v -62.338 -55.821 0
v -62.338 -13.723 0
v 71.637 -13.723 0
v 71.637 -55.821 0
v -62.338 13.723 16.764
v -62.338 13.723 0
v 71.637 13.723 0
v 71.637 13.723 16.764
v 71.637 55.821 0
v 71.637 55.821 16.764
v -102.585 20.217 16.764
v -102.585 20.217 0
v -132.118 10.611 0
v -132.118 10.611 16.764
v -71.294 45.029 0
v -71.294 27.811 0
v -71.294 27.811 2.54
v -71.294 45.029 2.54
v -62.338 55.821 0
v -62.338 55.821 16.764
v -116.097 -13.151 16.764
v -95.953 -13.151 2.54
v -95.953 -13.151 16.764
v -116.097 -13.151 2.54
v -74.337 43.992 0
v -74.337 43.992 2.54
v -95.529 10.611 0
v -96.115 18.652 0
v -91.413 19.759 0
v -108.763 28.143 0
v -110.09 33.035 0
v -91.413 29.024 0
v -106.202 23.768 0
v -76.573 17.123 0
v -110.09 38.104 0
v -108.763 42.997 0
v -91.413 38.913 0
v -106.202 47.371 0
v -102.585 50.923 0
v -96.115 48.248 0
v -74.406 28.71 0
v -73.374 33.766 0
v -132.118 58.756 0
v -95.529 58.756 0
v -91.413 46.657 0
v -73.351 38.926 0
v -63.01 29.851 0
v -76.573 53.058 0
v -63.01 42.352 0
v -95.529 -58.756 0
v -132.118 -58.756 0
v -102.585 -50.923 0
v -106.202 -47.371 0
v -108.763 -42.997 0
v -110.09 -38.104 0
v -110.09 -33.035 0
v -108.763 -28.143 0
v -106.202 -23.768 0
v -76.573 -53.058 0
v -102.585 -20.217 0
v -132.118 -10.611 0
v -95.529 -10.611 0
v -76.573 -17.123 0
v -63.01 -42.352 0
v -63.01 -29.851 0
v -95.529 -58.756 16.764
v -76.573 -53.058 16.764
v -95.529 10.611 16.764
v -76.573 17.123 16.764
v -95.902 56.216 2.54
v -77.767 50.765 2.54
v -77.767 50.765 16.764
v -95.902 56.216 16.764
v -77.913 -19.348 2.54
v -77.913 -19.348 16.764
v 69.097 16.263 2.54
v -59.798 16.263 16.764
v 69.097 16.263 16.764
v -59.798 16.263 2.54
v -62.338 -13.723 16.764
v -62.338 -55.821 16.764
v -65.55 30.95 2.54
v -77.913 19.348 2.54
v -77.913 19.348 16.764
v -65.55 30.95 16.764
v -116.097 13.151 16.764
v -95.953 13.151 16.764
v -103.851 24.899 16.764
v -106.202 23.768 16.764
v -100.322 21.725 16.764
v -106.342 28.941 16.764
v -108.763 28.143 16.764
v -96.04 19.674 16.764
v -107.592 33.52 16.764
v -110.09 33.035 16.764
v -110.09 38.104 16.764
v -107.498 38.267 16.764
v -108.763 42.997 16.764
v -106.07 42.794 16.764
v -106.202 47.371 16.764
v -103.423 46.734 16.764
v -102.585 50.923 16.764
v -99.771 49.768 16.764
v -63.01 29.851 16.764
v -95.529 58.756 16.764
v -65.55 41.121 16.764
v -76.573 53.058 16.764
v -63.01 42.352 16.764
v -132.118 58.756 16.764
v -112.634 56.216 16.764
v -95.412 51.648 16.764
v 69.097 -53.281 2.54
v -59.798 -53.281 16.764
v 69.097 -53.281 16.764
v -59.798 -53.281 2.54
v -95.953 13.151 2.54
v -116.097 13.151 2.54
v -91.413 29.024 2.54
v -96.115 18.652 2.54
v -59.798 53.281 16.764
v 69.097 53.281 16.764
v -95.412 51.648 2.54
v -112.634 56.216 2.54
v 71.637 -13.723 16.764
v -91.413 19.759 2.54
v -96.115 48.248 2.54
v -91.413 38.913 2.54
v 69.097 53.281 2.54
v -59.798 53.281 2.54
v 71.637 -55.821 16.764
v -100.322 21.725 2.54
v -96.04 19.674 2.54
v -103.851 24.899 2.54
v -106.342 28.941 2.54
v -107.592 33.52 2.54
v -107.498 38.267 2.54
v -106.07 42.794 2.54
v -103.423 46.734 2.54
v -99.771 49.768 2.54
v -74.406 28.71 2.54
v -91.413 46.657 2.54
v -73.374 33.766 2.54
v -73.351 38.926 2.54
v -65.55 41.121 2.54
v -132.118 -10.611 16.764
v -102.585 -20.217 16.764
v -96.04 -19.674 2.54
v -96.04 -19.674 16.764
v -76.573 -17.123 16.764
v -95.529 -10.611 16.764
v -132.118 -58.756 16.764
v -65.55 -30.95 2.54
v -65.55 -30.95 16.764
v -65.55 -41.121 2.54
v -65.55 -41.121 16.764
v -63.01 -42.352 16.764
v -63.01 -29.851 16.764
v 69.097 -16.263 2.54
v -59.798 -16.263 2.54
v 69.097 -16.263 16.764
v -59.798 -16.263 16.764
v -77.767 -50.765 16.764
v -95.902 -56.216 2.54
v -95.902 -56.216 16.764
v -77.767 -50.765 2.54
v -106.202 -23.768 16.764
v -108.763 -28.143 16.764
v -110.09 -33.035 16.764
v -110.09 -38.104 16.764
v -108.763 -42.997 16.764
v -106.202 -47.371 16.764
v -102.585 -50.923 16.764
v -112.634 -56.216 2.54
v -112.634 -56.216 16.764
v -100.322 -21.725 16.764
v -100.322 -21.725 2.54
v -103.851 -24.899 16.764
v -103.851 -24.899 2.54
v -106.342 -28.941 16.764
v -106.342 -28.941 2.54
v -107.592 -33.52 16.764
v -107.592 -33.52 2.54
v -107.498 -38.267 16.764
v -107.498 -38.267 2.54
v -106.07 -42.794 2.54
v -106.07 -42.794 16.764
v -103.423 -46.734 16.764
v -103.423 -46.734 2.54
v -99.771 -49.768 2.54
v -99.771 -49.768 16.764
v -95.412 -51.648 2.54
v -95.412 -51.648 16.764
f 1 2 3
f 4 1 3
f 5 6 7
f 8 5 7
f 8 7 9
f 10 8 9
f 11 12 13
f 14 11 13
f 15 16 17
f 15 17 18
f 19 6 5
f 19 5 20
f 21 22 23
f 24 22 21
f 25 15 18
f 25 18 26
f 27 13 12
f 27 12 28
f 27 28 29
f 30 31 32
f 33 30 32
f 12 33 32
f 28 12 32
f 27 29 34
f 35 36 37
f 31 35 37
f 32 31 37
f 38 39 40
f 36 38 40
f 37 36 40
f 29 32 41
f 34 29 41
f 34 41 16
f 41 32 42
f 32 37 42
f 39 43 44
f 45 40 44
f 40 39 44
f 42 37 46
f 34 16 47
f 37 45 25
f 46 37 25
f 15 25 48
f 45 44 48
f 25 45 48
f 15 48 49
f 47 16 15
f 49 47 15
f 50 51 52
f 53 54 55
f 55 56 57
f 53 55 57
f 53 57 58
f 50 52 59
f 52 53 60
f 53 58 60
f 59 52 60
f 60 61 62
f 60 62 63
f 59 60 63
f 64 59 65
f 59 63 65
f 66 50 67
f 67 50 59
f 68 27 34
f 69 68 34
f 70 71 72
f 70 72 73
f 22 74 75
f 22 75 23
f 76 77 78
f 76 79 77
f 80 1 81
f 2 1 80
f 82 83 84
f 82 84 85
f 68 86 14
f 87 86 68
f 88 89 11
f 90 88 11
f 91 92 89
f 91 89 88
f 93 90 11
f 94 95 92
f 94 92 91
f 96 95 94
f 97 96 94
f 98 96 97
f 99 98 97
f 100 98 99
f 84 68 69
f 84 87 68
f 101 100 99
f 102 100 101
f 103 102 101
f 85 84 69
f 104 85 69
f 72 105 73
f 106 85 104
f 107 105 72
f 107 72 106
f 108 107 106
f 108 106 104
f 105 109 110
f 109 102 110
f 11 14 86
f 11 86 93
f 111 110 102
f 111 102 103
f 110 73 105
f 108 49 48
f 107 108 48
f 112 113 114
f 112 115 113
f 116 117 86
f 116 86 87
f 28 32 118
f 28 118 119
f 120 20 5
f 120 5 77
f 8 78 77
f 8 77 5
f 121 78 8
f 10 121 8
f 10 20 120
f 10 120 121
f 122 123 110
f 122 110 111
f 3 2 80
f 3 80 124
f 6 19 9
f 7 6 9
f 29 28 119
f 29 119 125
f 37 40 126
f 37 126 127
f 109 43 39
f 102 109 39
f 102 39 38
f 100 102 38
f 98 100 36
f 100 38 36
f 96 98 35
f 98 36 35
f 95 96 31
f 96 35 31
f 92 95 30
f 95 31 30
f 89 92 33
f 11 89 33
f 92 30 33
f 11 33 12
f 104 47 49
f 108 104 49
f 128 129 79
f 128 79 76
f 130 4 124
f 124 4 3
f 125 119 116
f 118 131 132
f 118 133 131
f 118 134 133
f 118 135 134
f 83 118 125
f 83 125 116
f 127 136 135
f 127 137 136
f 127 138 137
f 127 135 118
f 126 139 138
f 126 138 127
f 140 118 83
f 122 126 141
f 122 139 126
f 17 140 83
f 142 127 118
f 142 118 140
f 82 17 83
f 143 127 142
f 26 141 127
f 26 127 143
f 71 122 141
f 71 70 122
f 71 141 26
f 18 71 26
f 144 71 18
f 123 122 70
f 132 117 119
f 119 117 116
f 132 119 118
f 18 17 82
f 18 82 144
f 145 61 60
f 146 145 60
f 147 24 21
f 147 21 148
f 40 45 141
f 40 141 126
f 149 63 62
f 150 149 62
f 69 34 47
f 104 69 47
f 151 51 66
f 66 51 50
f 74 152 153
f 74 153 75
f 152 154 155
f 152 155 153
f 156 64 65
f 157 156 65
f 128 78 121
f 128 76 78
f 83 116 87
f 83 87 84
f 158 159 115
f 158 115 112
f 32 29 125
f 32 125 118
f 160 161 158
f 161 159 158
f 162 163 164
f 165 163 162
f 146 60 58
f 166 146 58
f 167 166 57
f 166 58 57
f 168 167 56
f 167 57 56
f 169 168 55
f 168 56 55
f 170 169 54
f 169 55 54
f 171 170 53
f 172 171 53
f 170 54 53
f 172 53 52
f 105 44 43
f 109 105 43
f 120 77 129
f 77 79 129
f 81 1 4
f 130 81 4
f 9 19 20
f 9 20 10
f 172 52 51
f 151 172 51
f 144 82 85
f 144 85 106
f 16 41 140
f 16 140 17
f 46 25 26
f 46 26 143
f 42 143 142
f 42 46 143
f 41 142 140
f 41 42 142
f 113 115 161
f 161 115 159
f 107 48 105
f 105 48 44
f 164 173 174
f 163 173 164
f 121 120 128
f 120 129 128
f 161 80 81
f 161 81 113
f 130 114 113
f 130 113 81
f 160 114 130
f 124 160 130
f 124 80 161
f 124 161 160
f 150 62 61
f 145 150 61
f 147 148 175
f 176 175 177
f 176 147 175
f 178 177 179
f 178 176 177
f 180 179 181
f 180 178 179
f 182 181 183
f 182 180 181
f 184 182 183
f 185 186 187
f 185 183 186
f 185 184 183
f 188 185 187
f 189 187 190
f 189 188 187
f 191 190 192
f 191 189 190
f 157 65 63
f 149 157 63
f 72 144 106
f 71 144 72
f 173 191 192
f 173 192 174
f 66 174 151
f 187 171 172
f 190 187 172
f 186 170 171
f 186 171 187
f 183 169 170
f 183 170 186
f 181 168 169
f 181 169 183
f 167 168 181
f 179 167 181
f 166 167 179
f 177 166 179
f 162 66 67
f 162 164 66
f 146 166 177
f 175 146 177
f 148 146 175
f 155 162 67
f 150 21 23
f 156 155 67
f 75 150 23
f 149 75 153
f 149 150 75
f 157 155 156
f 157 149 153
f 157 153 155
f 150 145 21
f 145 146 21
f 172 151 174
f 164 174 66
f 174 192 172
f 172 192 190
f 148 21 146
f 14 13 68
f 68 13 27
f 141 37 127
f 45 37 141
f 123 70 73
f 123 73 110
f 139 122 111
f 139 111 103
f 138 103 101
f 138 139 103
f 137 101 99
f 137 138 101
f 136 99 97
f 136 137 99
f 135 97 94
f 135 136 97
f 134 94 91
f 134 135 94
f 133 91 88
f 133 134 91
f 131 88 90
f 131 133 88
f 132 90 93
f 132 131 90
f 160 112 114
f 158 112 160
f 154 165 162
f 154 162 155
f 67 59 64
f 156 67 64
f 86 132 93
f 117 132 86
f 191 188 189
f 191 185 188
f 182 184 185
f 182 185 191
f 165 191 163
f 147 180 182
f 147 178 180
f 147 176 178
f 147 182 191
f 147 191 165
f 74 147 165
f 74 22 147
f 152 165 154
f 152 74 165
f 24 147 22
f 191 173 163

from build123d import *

# Parameters (mm, degrees)
F0_W     = 133.9747868478
F0_H     = 42.098284699
F1_DEPTH = 16.764
F2_T     = -2.54
F2_2_T   = -2.54
F5_T     = -2.54
F6_T     = -2.54
F7_DEPTH = 39.37
F8_DEPTH = 66.548


with BuildPart() as f1:
    # F0 (on Top) → F1 (new body)
    with BuildSketch(Plane.XY):
        with Locations((4.6494696289, 34.7717883997)):
            Rectangle(F0_W, F0_H)
    extrude(amount=F1_DEPTH)

    # F2
    f2_openings = [f1.faces().sort_by_distance(p)[0] for p in [
        (4.64947, 34.771788, 16.764),
    ]]
    offset(amount=F2_T, openings=f2_openings)


with BuildPart() as f1b:
    # F0 (on Top) → F1, piece 2 (new body)
    with BuildSketch(Plane.XY):
        with Locations((4.6494696289, -34.7717883997)):
            Rectangle(F0_W, F0_H)
    extrude(amount=F1_DEPTH)

    # F2#2
    f2_2_openings = [f1b.faces().sort_by_distance(p)[0] for p in [
        (4.64947, -34.771788, 16.764),
    ]]
    offset(amount=F2_2_T, openings=f2_2_openings)


with BuildPart() as f1c:
    # F0 (on Top) → F1, piece 3 (new body)
    with BuildSketch(Plane.XY):
        with BuildLine():
            Line((-76.5726566315, 17.1231180429), (-63.0102530122, 29.8506766558))
            Line((-63.0102530122, 29.8506766558), (-63.0102530122, 42.3522405326))
            Line((-63.0102530122, 42.3522405326), (-76.5726566315, 53.0578419566))
            Line((-76.5726566315, 53.0578419566), (-95.5285131931, 58.7562285364))
            Line((-95.5285131931, 58.7562285364), (-132.1180015802, 58.7562285364))
            Line((-132.1180015802, 58.7562285364), (-102.5851592422, 50.9229898453))
            ThreePointArc((-102.5851592422, 50.9229898453), (-110.2581374608, 35.5698214844), (-102.5851592422, 20.2166531235))
            Line((-102.5851592422, 20.2166531235), (-132.1180015802, 10.6106773019))
            Line((-132.1180015802, 10.6106773019), (-95.5285131931, 10.6106773019))
            Line((-95.5285131931, 10.6106773019), (-76.5726566315, 17.1231180429))
        make_face()
    extrude(amount=F1_DEPTH)

    # F5
    f5_openings = [f1c.faces().sort_by_distance(p)[0] for p in [
        (-91.261215, 34.733918, 16.764),
    ]]
    offset(amount=F5_T, openings=f5_openings, kind=Kind.INTERSECTION)

    # F4 (on Top) → F7 (cut)
    with BuildSketch(Plane.XY):
        Polygon((-91.4129316807, 38.9127098024), (-91.4129316807, 46.6573499143), (-96.1150377989, 48.247769475), align=None)
        Polygon((-91.4129316807, 19.7585485876), (-91.4129316807, 29.0244594216), (-96.1150377989, 18.6521708965), align=None)
    extrude(amount=F7_DEPTH, mode=Mode.SUBTRACT)

    # F3 (on Top) → F8 (cut)
    with BuildSketch(Plane.XY):
        with BuildLine():
            ThreePointArc((-74.3365213275, 43.9915135503), (-73.2353599192, 36.3454557386), (-74.405670166, 28.7096761167))
            Line((-74.405670166, 28.7096761167), (-71.2939873338, 27.8107449412))
            Line((-71.2939873338, 27.8107449412), (-71.2939873338, 45.0287424028))
            Line((-71.2939873338, 45.0287424028), (-74.3365213275, 43.9915135503))
        make_face()
    extrude(amount=F8_DEPTH, mode=Mode.SUBTRACT)


with BuildPart() as f1d:
    # F0 (on Top) → F1, piece 4 (new body)
    with BuildSketch(Plane.XY):
        with BuildLine():
            Line((-63.0102530122, -29.8506766558), (-76.5726566315, -17.1231180429))
            Line((-76.5726566315, -17.1231180429), (-95.5285131931, -10.6106773019))
            Line((-95.5285131931, -10.6106773019), (-132.1180015802, -10.6106773019))
            Line((-132.1180015802, -10.6106773019), (-102.5851592422, -20.2166531235))
            ThreePointArc((-102.5851592422, -20.2166531235), (-110.2581374608, -35.5698214844), (-102.5851592422, -50.9229898453))
            Line((-102.5851592422, -50.9229898453), (-132.1180015802, -58.7562285364))
            Line((-132.1180015802, -58.7562285364), (-95.5285131931, -58.7562285364))
            Line((-95.5285131931, -58.7562285364), (-76.5726566315, -53.0578419566))
            Line((-76.5726566315, -53.0578419566), (-63.0102530122, -42.3522405326))
            Line((-63.0102530122, -42.3522405326), (-63.0102530122, -29.8506766558))
        make_face()
    extrude(amount=F1_DEPTH)

    # F6
    f6_openings = [f1d.faces().sort_by_distance(p)[0] for p in [
        (-91.261215, -34.733918, 16.764),
    ]]
    offset(amount=F6_T, openings=f6_openings, kind=Kind.INTERSECTION)


solid = Compound([f1.part, f1b.part, f1c.part, f1d.part])
